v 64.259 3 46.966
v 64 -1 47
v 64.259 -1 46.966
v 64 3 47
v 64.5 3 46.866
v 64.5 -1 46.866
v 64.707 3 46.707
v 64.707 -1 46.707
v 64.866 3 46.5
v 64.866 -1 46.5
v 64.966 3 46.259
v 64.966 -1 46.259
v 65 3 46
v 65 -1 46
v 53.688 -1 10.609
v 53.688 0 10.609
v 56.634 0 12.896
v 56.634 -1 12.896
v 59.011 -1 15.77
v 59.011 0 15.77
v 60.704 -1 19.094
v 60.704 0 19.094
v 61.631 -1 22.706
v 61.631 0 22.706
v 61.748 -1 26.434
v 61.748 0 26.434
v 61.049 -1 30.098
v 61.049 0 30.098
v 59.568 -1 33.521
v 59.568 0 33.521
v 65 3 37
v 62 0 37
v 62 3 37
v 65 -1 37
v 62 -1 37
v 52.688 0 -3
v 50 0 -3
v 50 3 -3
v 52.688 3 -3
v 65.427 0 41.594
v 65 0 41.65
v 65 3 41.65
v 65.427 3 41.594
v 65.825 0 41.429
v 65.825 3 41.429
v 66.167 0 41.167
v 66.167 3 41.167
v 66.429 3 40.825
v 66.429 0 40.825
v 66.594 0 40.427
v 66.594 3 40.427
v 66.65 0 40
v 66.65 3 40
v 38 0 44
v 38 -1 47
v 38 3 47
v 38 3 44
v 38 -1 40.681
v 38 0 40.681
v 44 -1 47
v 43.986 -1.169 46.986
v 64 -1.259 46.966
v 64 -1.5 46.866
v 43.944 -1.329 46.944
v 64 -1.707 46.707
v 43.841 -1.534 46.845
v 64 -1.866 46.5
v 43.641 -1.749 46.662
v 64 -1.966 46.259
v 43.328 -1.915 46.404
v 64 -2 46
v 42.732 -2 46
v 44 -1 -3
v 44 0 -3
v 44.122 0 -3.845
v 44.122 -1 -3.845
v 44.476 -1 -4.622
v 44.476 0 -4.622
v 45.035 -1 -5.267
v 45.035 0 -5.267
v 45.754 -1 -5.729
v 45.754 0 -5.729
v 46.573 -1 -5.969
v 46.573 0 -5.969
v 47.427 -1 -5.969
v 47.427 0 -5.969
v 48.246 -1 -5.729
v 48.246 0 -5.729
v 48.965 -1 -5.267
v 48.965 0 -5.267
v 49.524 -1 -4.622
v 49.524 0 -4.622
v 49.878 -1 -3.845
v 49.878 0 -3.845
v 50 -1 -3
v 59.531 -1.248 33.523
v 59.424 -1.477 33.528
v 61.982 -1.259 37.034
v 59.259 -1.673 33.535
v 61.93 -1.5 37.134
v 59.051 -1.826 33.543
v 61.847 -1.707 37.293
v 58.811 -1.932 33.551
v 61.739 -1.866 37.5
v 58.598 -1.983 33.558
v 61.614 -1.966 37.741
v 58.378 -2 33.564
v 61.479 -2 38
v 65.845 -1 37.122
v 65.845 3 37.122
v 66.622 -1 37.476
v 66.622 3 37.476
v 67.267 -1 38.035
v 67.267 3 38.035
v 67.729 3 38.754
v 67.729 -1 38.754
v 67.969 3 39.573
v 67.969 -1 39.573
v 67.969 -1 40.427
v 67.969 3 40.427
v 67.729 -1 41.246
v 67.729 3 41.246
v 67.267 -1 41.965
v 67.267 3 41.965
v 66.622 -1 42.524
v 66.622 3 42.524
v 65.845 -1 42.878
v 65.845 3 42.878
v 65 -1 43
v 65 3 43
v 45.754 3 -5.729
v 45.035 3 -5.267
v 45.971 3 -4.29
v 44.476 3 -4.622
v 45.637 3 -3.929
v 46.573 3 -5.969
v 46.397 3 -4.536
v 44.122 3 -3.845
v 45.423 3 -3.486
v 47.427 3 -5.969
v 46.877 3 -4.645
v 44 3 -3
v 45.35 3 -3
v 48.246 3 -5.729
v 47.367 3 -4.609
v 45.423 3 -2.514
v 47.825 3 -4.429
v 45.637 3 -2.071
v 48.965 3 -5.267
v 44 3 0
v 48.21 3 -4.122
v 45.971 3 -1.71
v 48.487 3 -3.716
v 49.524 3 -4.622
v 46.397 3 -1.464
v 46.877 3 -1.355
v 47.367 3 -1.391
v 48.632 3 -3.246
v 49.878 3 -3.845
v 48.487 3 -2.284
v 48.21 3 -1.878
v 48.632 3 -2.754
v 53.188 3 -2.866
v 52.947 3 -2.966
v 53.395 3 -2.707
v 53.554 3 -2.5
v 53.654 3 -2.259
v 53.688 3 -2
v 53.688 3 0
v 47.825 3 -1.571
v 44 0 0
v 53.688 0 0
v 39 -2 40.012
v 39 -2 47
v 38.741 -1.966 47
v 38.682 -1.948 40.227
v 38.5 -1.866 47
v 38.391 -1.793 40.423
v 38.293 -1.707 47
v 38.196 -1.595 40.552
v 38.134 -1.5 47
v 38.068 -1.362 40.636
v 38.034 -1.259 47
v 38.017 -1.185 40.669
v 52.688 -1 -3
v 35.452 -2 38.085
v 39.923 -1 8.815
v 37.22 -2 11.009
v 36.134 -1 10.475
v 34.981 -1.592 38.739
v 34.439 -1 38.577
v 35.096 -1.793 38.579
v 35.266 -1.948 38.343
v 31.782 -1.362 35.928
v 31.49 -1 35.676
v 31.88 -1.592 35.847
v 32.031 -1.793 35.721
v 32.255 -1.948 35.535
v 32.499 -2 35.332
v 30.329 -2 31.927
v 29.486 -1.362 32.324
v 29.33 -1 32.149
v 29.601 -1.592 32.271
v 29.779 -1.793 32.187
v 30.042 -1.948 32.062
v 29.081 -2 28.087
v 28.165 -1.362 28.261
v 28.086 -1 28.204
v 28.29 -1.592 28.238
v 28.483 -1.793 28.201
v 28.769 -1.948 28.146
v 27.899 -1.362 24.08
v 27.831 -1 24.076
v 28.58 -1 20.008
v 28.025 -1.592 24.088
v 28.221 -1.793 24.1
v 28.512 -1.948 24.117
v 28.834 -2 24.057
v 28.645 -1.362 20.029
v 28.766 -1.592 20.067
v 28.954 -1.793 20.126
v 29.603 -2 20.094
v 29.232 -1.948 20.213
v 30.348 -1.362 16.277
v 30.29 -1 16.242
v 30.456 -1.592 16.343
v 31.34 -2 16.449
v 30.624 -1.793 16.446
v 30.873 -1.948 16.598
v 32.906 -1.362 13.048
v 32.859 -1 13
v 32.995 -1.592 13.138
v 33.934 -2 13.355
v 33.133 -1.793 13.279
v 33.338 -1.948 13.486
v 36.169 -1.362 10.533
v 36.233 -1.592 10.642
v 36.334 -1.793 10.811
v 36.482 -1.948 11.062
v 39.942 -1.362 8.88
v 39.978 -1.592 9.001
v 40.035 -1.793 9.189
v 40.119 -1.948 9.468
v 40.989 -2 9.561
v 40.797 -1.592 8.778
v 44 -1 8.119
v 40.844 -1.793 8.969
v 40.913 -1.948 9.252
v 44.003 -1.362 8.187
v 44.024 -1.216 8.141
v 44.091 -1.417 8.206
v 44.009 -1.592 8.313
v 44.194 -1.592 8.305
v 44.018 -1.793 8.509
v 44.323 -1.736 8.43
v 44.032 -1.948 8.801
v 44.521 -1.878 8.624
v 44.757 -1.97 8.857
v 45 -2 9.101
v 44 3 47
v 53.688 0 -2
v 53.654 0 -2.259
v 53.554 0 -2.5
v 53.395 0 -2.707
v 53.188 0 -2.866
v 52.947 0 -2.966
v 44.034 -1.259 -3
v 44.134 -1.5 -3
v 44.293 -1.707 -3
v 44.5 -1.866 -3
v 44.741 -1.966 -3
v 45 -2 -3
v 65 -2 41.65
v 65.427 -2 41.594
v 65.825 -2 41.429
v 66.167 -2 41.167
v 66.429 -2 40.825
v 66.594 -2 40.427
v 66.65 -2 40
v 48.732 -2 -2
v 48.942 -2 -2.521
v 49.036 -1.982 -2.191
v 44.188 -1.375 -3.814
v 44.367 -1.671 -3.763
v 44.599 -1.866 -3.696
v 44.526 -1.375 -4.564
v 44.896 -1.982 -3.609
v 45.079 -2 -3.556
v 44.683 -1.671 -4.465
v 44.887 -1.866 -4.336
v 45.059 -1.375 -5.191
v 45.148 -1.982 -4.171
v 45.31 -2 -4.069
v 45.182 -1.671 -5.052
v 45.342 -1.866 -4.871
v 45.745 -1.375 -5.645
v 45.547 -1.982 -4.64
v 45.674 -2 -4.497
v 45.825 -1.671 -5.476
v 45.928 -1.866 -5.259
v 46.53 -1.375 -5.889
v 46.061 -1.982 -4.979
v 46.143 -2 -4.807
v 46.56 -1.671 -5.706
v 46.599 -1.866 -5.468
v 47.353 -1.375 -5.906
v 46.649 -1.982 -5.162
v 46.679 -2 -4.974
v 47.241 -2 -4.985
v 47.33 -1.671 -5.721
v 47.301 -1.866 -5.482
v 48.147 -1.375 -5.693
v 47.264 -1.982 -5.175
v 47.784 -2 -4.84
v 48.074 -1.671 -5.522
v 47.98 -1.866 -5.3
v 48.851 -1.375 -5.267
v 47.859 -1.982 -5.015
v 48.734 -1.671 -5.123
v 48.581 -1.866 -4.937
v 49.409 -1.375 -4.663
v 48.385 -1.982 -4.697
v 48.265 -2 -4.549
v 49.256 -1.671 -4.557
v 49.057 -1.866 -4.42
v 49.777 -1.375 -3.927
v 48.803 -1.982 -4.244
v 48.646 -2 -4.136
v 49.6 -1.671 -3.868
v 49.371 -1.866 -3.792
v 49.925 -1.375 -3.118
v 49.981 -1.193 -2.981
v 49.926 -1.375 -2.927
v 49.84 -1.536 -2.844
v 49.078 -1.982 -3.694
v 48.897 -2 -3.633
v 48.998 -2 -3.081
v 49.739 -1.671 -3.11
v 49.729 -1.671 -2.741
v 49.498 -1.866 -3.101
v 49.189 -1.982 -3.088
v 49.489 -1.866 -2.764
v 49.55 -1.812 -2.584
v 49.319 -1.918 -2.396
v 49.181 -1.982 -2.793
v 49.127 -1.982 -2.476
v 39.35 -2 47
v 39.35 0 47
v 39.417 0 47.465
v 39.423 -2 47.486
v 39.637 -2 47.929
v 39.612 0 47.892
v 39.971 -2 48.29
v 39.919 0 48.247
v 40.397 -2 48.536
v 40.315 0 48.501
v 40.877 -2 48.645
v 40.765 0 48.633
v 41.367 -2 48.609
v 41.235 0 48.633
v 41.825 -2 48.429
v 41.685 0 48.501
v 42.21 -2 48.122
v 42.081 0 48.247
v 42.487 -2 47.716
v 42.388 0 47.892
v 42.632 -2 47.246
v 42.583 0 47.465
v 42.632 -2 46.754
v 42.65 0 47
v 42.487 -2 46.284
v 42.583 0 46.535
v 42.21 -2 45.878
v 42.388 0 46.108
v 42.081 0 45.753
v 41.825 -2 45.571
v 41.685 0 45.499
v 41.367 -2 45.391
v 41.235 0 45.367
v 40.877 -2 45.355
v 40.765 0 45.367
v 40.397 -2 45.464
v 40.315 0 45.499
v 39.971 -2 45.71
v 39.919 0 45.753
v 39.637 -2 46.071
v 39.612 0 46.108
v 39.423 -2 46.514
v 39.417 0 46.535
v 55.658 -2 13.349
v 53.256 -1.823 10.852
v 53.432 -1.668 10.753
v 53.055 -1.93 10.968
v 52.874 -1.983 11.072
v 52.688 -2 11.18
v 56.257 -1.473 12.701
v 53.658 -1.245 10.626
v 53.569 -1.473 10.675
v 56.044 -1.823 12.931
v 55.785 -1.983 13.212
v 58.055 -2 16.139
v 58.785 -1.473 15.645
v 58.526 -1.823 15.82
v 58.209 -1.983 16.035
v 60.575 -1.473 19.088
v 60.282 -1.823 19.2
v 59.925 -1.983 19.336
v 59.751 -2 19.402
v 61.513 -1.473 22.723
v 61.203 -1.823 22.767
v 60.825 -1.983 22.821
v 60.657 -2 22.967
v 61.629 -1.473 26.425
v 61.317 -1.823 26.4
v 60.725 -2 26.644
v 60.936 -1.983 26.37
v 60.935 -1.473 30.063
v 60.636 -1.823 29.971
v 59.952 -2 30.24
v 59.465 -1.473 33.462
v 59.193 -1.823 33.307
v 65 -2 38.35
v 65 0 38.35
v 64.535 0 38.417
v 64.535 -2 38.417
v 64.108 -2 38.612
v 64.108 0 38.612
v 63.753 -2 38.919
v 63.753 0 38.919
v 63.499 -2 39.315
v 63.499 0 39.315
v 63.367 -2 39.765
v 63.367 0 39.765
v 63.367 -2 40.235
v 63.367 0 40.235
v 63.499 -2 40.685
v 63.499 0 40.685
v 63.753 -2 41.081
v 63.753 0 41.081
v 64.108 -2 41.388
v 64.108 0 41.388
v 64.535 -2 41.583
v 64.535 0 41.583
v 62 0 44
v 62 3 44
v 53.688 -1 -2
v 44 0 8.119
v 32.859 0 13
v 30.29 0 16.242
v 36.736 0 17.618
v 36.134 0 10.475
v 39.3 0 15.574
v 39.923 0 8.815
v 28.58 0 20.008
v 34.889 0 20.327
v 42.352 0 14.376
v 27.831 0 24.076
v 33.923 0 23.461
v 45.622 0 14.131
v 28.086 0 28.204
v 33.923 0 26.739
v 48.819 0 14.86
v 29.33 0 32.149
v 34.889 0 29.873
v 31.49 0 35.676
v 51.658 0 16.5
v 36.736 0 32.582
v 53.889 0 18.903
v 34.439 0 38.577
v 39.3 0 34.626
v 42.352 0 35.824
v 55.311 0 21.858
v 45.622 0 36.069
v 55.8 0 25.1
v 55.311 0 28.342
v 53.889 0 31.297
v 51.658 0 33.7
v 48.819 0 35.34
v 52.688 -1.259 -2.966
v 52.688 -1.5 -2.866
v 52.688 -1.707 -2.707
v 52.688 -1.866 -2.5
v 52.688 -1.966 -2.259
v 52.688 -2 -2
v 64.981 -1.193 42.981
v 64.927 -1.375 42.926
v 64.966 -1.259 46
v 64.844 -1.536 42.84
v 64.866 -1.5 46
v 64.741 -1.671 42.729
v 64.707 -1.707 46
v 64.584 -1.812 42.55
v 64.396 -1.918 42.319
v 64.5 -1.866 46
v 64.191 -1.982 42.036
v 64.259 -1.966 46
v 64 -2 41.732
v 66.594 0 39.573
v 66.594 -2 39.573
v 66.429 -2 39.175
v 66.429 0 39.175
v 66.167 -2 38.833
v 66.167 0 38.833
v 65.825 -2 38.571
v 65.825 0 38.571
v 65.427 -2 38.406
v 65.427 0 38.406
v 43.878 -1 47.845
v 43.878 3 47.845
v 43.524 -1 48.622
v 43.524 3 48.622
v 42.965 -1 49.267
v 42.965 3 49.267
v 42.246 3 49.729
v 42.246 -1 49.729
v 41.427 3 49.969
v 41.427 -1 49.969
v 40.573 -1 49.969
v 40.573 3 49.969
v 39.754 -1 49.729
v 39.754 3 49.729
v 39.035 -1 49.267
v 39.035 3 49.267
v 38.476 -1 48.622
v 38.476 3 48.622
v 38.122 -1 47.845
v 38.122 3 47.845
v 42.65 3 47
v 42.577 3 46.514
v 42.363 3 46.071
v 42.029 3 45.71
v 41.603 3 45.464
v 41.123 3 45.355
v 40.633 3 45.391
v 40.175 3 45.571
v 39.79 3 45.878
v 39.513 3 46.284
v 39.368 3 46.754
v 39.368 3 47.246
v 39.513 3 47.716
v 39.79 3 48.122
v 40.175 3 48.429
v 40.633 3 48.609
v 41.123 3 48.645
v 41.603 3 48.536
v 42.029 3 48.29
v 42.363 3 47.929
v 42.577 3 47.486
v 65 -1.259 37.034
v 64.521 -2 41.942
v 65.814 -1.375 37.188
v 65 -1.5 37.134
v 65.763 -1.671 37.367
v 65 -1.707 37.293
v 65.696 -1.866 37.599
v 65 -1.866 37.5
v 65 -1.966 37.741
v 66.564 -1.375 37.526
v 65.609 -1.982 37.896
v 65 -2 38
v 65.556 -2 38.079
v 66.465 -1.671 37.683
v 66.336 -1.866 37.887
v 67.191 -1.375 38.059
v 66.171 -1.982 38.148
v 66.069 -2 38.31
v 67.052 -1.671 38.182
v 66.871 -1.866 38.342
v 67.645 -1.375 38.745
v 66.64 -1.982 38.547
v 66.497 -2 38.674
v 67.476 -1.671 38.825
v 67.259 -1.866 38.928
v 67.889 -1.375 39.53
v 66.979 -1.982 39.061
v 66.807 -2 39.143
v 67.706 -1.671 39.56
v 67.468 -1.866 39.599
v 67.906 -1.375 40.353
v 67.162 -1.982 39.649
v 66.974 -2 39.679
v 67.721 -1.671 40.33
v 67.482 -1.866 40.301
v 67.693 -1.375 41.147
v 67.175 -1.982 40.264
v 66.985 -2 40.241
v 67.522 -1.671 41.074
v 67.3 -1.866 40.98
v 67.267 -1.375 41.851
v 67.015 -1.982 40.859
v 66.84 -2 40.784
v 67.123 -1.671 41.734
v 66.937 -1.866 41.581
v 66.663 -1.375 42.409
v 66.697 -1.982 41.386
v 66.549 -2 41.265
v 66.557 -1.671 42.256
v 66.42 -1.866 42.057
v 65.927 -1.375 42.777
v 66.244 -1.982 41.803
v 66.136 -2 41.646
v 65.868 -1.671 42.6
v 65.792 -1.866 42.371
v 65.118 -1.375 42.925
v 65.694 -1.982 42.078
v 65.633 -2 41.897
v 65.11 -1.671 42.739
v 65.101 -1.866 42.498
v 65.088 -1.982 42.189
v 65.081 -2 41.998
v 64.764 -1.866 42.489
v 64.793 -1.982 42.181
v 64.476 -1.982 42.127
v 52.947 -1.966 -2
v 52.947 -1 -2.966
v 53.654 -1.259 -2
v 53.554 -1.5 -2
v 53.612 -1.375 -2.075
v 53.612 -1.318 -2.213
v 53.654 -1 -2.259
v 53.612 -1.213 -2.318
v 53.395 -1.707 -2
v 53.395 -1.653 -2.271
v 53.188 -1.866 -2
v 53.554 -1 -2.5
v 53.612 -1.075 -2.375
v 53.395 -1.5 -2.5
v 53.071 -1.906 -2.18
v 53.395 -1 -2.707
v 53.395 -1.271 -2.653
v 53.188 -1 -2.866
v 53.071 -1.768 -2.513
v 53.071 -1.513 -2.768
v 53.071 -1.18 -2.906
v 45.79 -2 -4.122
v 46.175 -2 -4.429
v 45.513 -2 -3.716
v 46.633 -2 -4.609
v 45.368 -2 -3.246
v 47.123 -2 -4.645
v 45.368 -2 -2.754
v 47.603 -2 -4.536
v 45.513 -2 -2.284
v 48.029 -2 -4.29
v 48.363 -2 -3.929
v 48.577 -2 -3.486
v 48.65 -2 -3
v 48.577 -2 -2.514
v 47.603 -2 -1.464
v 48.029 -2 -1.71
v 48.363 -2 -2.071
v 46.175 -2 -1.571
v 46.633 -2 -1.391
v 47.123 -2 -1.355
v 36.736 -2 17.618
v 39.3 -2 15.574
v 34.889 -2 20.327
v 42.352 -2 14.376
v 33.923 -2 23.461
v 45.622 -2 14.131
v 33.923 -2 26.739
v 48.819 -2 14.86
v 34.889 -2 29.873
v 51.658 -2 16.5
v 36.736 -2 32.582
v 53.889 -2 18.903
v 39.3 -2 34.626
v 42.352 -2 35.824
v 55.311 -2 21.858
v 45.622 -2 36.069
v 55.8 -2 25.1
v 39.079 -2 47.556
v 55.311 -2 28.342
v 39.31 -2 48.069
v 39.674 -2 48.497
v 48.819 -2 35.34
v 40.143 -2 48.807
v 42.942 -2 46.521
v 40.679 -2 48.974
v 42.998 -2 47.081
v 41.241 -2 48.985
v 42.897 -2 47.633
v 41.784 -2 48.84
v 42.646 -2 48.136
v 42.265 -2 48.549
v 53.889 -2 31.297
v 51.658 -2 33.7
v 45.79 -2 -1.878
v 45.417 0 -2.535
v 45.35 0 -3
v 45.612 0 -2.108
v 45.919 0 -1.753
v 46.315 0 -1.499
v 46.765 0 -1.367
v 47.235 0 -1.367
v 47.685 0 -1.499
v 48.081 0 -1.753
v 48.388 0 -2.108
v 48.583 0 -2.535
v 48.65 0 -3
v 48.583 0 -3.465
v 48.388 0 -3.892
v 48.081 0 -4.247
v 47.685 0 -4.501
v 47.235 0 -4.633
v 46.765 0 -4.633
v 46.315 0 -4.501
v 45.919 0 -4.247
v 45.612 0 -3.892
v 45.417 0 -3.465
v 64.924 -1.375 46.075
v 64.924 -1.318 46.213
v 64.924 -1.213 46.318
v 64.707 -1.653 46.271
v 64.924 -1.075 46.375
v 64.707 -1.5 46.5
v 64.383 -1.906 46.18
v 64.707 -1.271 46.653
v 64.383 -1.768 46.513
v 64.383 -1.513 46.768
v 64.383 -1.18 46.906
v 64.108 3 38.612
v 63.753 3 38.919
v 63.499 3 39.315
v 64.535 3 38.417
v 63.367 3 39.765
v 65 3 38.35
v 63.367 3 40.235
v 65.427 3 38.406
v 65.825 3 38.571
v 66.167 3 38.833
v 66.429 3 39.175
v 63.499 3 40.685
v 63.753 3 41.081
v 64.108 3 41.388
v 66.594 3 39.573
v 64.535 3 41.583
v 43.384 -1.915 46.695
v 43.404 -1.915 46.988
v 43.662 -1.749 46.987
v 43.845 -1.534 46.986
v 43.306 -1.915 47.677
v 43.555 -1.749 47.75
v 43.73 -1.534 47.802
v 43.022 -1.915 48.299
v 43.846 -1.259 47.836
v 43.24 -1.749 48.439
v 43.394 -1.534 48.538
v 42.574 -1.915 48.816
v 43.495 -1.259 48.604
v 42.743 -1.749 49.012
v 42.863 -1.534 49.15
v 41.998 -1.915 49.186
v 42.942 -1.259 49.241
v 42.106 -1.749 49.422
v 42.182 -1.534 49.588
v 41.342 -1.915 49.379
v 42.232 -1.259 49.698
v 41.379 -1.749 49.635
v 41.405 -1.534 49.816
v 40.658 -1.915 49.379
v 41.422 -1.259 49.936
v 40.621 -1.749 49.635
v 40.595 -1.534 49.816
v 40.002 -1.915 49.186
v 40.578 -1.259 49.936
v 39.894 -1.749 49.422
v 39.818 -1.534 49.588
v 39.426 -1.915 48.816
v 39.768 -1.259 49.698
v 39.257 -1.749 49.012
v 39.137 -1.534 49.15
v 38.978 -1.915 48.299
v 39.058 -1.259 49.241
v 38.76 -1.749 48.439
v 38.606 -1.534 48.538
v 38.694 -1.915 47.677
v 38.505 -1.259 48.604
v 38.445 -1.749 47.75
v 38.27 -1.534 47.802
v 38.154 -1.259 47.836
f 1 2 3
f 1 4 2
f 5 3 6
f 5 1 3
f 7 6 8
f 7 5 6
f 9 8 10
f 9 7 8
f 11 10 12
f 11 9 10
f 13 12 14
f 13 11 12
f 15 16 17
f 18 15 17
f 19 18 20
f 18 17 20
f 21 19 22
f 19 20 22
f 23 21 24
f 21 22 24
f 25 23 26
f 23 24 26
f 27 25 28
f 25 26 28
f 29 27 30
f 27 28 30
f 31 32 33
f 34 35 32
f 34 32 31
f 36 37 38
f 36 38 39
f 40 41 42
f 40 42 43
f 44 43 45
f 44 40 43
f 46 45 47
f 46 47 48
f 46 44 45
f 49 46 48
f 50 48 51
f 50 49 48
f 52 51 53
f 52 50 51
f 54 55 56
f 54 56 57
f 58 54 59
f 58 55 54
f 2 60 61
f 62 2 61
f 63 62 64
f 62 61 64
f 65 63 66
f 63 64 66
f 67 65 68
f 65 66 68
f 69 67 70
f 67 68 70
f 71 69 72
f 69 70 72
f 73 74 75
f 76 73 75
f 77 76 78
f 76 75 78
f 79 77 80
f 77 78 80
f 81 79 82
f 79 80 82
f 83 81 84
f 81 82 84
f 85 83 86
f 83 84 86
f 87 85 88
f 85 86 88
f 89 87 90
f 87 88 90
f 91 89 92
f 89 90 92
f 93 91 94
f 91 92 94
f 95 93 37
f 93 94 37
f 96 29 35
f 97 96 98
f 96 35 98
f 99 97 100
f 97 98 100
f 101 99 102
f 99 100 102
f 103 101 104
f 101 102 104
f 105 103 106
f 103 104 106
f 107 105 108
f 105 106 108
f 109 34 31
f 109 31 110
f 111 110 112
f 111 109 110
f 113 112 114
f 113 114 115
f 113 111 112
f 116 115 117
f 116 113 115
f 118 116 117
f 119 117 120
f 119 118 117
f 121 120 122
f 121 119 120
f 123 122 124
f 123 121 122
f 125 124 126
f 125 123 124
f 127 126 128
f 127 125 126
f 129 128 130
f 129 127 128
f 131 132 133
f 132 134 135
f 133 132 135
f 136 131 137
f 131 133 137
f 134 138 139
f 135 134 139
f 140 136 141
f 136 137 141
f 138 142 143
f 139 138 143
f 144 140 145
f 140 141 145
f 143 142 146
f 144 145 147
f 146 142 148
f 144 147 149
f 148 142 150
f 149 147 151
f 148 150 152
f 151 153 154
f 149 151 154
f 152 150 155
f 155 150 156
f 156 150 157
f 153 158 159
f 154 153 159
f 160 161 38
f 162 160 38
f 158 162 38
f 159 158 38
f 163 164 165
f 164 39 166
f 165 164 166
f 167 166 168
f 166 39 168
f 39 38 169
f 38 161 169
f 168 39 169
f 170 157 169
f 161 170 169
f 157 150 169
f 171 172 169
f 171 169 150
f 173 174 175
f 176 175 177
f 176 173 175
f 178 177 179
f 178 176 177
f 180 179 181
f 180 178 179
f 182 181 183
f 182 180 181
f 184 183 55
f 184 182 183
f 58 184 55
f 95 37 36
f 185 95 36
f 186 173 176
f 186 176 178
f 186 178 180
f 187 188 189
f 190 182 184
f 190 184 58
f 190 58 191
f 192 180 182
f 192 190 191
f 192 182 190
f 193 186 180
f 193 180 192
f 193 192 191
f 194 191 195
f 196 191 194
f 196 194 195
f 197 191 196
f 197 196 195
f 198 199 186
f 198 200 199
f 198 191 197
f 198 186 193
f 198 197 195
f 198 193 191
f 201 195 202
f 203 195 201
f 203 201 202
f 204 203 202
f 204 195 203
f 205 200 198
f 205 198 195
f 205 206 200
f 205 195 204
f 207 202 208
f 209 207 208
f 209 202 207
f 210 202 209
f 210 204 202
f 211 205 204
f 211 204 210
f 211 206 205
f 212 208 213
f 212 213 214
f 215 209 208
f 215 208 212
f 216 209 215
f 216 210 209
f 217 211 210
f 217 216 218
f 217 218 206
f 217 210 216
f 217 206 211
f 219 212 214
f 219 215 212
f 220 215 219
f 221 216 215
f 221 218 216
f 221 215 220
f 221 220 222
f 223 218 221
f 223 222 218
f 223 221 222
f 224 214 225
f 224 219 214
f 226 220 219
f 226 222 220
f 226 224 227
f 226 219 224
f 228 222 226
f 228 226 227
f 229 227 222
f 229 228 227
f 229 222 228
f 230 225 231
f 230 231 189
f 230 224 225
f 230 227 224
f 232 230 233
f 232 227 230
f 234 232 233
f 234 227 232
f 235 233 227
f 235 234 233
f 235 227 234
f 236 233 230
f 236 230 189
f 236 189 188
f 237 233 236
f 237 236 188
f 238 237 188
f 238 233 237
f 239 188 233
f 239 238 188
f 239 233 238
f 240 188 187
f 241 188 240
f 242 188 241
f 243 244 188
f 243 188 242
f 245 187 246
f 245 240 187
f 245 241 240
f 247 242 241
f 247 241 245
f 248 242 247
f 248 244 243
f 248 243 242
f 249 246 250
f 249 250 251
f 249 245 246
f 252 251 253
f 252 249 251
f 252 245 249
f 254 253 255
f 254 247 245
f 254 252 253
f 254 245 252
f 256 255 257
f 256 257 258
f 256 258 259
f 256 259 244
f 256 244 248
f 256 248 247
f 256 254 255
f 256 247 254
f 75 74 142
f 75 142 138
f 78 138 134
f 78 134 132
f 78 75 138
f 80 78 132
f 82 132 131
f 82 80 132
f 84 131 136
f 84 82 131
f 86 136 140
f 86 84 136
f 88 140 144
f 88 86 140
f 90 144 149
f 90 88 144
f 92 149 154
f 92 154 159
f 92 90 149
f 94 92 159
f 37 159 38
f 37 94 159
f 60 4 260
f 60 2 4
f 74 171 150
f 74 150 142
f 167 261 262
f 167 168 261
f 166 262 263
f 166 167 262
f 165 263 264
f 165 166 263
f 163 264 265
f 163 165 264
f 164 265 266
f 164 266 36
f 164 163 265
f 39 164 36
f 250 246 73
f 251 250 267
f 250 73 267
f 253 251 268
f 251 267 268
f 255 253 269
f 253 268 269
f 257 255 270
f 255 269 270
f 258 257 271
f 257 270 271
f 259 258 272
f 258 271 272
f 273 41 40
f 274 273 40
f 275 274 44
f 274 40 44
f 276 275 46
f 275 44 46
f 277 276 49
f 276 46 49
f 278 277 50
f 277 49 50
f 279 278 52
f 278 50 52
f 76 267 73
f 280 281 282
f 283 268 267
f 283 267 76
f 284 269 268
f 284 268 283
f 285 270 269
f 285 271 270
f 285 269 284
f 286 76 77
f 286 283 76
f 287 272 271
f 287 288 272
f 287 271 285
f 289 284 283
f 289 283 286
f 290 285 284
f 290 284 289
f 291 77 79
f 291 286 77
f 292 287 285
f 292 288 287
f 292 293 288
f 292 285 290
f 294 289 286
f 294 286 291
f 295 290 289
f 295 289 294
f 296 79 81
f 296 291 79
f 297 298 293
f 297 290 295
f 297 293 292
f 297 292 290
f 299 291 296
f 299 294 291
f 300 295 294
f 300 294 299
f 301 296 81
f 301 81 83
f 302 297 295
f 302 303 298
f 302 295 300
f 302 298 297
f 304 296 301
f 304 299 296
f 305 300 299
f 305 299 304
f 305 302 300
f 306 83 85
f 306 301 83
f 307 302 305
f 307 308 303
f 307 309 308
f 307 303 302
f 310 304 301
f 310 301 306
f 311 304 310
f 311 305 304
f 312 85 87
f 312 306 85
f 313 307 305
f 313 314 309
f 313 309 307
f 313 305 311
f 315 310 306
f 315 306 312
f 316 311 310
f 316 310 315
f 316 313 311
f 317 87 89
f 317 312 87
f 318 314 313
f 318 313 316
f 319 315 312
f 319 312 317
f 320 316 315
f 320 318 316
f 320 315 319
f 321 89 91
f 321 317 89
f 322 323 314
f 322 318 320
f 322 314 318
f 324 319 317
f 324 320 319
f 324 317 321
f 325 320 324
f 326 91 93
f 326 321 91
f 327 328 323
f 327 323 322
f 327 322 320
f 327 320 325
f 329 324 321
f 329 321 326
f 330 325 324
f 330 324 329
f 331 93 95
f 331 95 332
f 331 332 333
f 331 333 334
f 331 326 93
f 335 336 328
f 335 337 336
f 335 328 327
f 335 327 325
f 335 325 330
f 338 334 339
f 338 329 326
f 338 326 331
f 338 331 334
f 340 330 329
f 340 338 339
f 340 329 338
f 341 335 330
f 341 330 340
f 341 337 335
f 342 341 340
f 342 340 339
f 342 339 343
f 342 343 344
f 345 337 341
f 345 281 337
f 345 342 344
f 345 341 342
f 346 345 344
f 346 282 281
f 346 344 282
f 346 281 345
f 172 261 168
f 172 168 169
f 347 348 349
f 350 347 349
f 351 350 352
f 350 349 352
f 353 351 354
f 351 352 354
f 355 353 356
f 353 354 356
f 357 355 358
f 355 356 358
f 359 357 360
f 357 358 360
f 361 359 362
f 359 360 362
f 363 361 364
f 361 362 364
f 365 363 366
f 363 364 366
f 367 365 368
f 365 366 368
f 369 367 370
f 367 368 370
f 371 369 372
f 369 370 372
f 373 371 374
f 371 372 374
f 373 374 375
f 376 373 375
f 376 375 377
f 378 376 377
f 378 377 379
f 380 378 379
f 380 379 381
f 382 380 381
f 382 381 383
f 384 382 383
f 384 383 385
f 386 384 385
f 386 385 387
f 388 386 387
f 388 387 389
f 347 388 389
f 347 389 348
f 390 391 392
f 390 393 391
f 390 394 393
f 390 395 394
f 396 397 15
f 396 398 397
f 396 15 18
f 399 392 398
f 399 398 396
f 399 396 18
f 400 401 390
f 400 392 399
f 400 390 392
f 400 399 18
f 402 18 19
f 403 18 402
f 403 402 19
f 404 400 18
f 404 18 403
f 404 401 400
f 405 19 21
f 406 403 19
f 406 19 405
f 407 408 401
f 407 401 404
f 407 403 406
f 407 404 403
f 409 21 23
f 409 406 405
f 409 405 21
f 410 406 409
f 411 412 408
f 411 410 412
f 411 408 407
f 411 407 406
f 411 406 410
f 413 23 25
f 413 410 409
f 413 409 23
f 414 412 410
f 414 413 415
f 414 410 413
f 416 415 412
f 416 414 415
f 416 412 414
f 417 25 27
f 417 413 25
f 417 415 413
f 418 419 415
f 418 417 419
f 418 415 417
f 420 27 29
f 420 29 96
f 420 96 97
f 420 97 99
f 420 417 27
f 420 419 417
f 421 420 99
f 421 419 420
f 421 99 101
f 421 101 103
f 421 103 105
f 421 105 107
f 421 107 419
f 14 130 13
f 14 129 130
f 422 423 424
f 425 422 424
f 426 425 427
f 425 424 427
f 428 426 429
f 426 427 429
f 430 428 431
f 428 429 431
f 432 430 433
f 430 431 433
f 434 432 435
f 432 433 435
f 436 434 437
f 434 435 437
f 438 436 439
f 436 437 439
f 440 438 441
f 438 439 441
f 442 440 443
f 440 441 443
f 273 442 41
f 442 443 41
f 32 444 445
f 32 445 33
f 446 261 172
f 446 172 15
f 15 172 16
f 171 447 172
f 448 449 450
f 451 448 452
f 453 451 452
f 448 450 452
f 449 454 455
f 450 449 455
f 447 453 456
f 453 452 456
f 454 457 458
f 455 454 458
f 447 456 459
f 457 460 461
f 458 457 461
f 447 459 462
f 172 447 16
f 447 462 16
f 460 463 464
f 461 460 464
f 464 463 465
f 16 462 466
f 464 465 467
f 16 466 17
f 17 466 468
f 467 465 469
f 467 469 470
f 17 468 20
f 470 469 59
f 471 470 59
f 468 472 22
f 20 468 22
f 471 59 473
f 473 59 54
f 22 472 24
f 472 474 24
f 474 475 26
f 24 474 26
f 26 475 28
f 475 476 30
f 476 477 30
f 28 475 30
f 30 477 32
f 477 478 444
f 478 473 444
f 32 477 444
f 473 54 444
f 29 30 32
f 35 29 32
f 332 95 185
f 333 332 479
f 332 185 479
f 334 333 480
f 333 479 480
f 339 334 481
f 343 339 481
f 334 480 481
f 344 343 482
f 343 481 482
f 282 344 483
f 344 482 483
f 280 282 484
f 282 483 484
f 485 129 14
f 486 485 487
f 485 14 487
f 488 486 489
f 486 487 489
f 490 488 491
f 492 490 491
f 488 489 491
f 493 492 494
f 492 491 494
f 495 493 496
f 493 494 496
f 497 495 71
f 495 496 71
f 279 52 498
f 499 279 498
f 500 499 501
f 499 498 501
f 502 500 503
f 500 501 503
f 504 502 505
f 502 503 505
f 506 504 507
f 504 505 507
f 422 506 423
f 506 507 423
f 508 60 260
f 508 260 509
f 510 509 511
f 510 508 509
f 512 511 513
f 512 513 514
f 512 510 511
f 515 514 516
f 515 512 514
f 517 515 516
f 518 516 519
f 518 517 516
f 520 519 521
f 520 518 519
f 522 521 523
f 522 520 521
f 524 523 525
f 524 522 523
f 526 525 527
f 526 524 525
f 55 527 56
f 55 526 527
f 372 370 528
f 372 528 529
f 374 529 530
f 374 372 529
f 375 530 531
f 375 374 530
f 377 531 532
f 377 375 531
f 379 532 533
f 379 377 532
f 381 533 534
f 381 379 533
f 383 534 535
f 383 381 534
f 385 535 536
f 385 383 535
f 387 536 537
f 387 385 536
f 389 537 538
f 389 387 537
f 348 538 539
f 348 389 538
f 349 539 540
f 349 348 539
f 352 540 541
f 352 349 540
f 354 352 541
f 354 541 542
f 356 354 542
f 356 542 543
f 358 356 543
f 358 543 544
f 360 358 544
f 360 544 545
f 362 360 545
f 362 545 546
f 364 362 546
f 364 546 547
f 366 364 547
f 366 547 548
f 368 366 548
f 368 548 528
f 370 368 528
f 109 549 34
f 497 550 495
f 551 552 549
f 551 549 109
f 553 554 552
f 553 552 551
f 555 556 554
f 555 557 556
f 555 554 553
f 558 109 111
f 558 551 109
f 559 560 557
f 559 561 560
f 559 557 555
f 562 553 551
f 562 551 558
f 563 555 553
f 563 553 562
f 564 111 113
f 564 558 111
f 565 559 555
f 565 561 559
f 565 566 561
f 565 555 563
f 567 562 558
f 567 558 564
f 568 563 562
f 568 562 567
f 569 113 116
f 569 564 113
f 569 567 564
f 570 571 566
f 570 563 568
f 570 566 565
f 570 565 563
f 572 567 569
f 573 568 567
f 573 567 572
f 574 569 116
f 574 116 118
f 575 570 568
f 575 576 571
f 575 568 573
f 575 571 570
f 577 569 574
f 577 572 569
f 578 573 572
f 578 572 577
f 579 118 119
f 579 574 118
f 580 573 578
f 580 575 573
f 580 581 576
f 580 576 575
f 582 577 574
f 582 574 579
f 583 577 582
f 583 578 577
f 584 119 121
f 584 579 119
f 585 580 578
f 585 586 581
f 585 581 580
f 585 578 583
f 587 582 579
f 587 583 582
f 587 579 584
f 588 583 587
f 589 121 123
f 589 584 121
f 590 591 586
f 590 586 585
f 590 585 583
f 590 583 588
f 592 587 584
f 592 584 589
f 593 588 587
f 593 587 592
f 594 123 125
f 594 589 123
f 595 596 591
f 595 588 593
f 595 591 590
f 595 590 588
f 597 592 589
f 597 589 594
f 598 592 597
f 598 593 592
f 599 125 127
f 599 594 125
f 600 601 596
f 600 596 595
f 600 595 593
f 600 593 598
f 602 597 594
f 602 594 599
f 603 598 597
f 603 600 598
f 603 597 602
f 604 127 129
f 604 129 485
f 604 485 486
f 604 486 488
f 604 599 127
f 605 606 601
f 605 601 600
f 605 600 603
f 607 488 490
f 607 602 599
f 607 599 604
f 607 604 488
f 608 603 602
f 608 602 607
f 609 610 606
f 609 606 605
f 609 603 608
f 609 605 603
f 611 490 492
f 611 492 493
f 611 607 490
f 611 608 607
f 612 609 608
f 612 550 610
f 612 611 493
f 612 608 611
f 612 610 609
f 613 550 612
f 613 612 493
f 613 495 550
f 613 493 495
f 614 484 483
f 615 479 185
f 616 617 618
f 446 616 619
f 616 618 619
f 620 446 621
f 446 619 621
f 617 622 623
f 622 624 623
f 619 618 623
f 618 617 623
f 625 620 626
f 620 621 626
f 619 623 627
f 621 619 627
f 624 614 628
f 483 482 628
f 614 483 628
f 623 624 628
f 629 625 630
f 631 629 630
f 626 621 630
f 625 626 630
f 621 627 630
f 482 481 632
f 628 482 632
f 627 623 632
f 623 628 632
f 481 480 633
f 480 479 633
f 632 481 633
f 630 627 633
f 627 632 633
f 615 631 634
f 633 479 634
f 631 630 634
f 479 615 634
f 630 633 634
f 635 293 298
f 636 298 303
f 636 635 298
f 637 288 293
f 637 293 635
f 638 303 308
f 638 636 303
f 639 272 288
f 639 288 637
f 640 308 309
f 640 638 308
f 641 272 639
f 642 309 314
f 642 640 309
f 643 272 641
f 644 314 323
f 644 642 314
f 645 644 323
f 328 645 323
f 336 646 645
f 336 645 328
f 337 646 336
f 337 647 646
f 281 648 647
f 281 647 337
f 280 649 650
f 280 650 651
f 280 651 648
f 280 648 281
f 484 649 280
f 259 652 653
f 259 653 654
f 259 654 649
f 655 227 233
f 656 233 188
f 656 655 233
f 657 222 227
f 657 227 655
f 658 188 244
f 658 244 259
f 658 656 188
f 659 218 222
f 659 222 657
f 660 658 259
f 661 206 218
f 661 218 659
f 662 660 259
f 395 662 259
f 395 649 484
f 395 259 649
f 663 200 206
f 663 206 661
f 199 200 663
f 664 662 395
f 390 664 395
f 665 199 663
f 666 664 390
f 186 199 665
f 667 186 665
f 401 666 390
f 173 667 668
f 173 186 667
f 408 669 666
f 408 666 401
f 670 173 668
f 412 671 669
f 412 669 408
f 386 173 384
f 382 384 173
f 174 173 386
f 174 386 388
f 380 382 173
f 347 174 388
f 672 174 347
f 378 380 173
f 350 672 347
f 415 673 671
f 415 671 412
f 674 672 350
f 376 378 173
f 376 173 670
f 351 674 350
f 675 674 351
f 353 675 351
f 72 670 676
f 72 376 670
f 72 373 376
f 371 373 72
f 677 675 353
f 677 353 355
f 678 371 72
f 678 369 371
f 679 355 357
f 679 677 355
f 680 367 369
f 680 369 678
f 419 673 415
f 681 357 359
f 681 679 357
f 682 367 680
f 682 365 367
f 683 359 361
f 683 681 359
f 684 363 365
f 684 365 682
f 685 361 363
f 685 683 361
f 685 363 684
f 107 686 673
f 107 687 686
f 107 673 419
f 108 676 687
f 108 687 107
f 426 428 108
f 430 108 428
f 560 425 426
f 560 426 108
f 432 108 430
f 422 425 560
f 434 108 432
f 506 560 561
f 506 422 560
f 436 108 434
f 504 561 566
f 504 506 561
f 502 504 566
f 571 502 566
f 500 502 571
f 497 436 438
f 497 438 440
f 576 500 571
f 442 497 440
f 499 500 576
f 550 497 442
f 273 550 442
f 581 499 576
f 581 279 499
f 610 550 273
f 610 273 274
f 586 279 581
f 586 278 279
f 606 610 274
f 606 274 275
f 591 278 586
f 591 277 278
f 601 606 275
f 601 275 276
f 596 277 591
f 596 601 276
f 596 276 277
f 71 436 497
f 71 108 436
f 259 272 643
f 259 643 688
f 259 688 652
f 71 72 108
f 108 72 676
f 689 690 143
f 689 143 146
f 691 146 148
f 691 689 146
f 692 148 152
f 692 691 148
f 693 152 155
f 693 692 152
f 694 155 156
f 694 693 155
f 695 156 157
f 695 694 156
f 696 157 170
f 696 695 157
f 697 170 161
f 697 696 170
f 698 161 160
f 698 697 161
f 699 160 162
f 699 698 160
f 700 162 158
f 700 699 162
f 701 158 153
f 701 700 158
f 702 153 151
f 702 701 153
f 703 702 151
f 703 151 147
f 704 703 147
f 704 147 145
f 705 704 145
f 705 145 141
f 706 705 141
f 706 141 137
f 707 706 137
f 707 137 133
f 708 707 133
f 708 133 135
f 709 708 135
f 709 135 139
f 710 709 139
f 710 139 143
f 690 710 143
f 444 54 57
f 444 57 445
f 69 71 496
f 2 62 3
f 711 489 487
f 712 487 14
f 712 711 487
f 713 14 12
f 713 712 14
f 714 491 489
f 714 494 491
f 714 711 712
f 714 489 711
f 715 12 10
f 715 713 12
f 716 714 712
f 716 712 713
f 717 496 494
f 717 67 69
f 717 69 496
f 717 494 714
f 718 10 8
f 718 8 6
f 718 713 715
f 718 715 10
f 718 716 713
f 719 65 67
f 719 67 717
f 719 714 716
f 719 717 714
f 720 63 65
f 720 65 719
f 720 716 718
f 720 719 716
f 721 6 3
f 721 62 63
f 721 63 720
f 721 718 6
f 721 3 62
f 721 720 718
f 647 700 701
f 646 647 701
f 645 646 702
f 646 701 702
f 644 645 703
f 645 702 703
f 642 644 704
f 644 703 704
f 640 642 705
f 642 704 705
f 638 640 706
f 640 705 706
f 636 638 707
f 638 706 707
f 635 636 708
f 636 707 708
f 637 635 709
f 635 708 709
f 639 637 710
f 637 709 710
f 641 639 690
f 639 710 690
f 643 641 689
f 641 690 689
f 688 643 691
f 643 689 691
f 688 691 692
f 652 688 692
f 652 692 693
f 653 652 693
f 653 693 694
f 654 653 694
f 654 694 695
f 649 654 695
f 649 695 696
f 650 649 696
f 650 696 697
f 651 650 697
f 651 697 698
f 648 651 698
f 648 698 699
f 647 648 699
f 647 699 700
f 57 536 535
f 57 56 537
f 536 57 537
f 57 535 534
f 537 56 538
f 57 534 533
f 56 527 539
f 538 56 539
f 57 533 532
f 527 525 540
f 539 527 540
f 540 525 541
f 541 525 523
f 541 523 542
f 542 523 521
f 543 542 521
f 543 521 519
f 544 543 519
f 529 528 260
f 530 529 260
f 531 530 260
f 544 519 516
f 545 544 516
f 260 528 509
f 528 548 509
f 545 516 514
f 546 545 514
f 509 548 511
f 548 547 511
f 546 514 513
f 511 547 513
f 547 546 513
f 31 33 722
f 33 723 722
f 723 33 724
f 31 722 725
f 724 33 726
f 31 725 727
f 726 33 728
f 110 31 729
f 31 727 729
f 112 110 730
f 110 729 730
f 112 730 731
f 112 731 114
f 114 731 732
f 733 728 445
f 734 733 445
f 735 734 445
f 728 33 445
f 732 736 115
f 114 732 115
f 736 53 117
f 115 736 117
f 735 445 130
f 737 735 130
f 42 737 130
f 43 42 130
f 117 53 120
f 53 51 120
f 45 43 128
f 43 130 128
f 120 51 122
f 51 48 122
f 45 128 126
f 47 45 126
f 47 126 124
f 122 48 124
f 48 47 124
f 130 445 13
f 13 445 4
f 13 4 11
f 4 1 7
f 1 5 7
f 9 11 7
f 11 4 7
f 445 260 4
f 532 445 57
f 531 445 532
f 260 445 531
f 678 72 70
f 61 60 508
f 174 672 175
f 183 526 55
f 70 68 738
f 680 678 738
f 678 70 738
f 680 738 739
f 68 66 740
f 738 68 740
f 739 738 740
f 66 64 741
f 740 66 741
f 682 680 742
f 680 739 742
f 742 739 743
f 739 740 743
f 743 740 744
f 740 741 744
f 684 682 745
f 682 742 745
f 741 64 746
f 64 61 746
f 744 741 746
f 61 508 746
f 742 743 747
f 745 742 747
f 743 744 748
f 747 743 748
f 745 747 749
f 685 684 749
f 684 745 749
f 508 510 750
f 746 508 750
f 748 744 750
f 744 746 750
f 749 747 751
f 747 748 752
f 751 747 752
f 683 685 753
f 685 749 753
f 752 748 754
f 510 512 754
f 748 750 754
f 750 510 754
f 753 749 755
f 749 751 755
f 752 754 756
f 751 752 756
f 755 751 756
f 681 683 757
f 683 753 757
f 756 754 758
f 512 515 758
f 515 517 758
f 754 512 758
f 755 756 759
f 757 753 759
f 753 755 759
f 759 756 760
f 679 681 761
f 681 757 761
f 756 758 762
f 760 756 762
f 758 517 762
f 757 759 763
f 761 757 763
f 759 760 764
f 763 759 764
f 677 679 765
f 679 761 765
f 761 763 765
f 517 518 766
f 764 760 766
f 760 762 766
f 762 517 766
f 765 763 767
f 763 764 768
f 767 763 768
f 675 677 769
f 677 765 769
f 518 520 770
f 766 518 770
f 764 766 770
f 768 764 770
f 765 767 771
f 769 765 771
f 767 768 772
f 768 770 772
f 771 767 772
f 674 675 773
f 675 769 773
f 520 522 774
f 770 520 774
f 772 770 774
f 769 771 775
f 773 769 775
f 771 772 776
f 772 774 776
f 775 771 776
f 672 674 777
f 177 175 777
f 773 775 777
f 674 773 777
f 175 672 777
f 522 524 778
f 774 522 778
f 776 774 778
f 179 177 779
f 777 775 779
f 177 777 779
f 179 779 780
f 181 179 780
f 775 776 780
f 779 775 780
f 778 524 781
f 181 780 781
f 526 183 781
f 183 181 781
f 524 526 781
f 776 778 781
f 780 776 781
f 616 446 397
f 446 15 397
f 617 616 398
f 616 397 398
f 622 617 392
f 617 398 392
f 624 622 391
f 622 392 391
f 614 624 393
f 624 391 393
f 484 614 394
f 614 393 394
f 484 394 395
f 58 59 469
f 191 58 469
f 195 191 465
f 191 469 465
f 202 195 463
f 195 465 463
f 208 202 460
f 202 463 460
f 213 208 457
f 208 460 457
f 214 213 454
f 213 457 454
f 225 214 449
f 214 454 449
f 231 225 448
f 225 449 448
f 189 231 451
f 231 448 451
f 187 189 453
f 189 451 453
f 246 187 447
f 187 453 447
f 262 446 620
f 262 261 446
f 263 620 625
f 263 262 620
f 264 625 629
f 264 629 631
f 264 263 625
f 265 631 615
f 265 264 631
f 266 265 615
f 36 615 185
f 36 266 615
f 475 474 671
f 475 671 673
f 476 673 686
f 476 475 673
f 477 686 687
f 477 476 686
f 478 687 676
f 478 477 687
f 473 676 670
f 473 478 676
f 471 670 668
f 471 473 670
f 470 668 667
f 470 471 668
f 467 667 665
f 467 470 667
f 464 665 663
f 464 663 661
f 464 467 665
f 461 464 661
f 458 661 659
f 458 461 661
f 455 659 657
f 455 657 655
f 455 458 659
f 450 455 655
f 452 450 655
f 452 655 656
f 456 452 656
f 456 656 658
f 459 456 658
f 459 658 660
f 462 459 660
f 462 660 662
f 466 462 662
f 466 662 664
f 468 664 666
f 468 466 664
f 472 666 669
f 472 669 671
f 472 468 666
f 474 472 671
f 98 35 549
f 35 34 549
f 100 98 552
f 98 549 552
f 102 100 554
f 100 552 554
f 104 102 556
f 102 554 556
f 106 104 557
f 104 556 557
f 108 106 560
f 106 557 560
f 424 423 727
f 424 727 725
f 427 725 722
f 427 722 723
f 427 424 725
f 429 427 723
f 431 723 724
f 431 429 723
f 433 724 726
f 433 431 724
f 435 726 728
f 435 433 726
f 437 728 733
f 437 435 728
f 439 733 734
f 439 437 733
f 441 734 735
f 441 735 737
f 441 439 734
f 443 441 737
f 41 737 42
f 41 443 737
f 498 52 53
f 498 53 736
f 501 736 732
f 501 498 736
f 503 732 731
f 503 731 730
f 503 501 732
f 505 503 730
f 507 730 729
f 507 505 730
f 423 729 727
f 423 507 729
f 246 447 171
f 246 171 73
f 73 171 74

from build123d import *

# Parameters (mm, degrees)
F0_R     = 11
F1_DEPTH = 2
F2_DEPTH = 3
F3_R     = 1


with BuildPart() as f1:
    # F0 (on Front) → F1 (new body)
    with BuildSketch(Plane.XZ):
        with BuildLine():
            Line((38, 47), (38, 44))
            Line((38, 44), (62, 44))
            Line((62, 44), (62, 37))
            Line((62, 37), (65, 37))
            Line((65, 37), (65, 38.35))
            ThreePointArc((65, 38.35), (63.35, 40), (65, 41.65))
            Line((65, 41.65), (65, 43))
            Line((65, 43), (65, 47))
            Line((65, 47), (44, 47))
            Line((44, 47), (42.65, 47))
            ThreePointArc((42.65, 47), (41, 45.35), (39.35, 47))
            Line((39.35, 47), (38, 47))
        make_face()
        with BuildLine():
            ThreePointArc((44, 47), (41, 50), (38, 47))
            Line((38, 47), (39.35, 47))
            ThreePointArc((39.35, 47), (41, 48.65), (42.65, 47))
            Line((42.65, 47), (44, 47))
        make_face()
        with BuildLine():
            Line((62, 44), (38, 44))
            Line((38, 44), (38, 40.6807573628))
            ThreePointArc((38, 40.6807573628), (28.0814559879, 22.0193692019), (44, 8.1188339623))
            Line((44, 8.1188339623), (44, 0))
            Line((44, 0), (53.6880180275, 0))
            Line((53.6880180275, 0), (53.6880180275, 10.6085150677))
            ThreePointArc((53.6880180275, 10.6085150677), (61.2664808606, 20.8744813256), (59.5676963486, 33.5211130236))
            Line((59.5676963486, 33.5211130236), (62, 37))
            Line((62, 37), (62, 44))
        make_face()
        with Locations((44.8, 25.1)):
            Circle(F0_R, mode=Mode.SUBTRACT)
        with BuildLine():
            Line((53.6880180275, 0), (44, 0))
            Line((44, 0), (44, -3))
            Line((44, -3), (45.35, -3))
            ThreePointArc((45.35, -3), (47, -1.35), (48.65, -3))
            Line((48.65, -3), (50, -3))
            Line((50, -3), (53.6880180275, -3))
            Line((53.6880180275, -3), (53.6880180275, 0))
        make_face()
        with BuildLine():
            Line((45.35, -3), (44, -3))
            ThreePointArc((44, -3), (47, -6), (50, -3))
            Line((50, -3), (48.65, -3))
            ThreePointArc((48.65, -3), (47, -4.65), (45.35, -3))
        make_face()
        with BuildLine():
            Line((65, 38.35), (65, 37))
            ThreePointArc((65, 37), (68, 40), (65, 43))
            Line((65, 43), (65, 41.65))
            ThreePointArc((65, 41.65), (66.166726189, 41.166726189), (66.65, 40))
            ThreePointArc((66.65, 40), (66.166726189, 38.833273811), (65, 38.35))
        make_face()
    extrude(amount=F1_DEPTH)

    # F0 (on Front) → F2 (join)
    with BuildSketch(Plane.XZ):
        with BuildLine():
            ThreePointArc((44, 47), (41, 50), (38, 47))
            Line((38, 47), (39.35, 47))
            ThreePointArc((39.35, 47), (41, 48.65), (42.65, 47))
            Line((42.65, 47), (44, 47))
        make_face()
        with BuildLine():
            Line((38, 47), (38, 44))
            Line((38, 44), (62, 44))
            Line((62, 44), (62, 37))
            Line((62, 37), (65, 37))
            Line((65, 37), (65, 38.35))
            ThreePointArc((65, 38.35), (63.35, 40), (65, 41.65))
            Line((65, 41.65), (65, 43))
            Line((65, 43), (65, 47))
            Line((65, 47), (44, 47))
            Line((44, 47), (42.65, 47))
            ThreePointArc((42.65, 47), (41, 45.35), (39.35, 47))
            Line((39.35, 47), (38, 47))
        make_face()
        with BuildLine():
            Line((65, 38.35), (65, 37))
            ThreePointArc((65, 37), (68, 40), (65, 43))
            Line((65, 43), (65, 41.65))
            ThreePointArc((65, 41.65), (66.166726189, 41.166726189), (66.65, 40))
            ThreePointArc((66.65, 40), (66.166726189, 38.833273811), (65, 38.35))
        make_face()
        with BuildLine():
            Line((45.35, -3), (44, -3))
            ThreePointArc((44, -3), (47, -6), (50, -3))
            Line((50, -3), (48.65, -3))
            ThreePointArc((48.65, -3), (47, -4.65), (45.35, -3))
        make_face()
        with BuildLine():
            Line((53.6880180275, 0), (44, 0))
            Line((44, 0), (44, -3))
            Line((44, -3), (45.35, -3))
            ThreePointArc((45.35, -3), (47, -1.35), (48.65, -3))
            Line((48.65, -3), (50, -3))
            Line((50, -3), (53.6880180275, -3))
            Line((53.6880180275, -3), (53.6880180275, 0))
        make_face()
    extrude(amount=-F2_DEPTH)

    # F3
    f3_edges = [f1.edges().sort_by_distance(p)[0] for p in [
        (38, -2, 43.840379),
        (41, -2, 50),
        (54.5, -2, 47),
        (65, -2, 45),
        (68, -2, 40),
        (63.5, -2, 37),
        (60.783848, -2, 35.260557),
        (61.266481, -2, 20.874481),
        (44, -2, 2.559417),
        (47, -2, -6),
        (51.844009, -2, -3),
        (53.688018, -2, 3.804258),
        (65, 0.5, 47),
        (53.688018, 0.5, -3),
        (28.081456, -2, 22.019369),
    ]]
    fillet(f3_edges, radius=F3_R)


solid = f1.part
